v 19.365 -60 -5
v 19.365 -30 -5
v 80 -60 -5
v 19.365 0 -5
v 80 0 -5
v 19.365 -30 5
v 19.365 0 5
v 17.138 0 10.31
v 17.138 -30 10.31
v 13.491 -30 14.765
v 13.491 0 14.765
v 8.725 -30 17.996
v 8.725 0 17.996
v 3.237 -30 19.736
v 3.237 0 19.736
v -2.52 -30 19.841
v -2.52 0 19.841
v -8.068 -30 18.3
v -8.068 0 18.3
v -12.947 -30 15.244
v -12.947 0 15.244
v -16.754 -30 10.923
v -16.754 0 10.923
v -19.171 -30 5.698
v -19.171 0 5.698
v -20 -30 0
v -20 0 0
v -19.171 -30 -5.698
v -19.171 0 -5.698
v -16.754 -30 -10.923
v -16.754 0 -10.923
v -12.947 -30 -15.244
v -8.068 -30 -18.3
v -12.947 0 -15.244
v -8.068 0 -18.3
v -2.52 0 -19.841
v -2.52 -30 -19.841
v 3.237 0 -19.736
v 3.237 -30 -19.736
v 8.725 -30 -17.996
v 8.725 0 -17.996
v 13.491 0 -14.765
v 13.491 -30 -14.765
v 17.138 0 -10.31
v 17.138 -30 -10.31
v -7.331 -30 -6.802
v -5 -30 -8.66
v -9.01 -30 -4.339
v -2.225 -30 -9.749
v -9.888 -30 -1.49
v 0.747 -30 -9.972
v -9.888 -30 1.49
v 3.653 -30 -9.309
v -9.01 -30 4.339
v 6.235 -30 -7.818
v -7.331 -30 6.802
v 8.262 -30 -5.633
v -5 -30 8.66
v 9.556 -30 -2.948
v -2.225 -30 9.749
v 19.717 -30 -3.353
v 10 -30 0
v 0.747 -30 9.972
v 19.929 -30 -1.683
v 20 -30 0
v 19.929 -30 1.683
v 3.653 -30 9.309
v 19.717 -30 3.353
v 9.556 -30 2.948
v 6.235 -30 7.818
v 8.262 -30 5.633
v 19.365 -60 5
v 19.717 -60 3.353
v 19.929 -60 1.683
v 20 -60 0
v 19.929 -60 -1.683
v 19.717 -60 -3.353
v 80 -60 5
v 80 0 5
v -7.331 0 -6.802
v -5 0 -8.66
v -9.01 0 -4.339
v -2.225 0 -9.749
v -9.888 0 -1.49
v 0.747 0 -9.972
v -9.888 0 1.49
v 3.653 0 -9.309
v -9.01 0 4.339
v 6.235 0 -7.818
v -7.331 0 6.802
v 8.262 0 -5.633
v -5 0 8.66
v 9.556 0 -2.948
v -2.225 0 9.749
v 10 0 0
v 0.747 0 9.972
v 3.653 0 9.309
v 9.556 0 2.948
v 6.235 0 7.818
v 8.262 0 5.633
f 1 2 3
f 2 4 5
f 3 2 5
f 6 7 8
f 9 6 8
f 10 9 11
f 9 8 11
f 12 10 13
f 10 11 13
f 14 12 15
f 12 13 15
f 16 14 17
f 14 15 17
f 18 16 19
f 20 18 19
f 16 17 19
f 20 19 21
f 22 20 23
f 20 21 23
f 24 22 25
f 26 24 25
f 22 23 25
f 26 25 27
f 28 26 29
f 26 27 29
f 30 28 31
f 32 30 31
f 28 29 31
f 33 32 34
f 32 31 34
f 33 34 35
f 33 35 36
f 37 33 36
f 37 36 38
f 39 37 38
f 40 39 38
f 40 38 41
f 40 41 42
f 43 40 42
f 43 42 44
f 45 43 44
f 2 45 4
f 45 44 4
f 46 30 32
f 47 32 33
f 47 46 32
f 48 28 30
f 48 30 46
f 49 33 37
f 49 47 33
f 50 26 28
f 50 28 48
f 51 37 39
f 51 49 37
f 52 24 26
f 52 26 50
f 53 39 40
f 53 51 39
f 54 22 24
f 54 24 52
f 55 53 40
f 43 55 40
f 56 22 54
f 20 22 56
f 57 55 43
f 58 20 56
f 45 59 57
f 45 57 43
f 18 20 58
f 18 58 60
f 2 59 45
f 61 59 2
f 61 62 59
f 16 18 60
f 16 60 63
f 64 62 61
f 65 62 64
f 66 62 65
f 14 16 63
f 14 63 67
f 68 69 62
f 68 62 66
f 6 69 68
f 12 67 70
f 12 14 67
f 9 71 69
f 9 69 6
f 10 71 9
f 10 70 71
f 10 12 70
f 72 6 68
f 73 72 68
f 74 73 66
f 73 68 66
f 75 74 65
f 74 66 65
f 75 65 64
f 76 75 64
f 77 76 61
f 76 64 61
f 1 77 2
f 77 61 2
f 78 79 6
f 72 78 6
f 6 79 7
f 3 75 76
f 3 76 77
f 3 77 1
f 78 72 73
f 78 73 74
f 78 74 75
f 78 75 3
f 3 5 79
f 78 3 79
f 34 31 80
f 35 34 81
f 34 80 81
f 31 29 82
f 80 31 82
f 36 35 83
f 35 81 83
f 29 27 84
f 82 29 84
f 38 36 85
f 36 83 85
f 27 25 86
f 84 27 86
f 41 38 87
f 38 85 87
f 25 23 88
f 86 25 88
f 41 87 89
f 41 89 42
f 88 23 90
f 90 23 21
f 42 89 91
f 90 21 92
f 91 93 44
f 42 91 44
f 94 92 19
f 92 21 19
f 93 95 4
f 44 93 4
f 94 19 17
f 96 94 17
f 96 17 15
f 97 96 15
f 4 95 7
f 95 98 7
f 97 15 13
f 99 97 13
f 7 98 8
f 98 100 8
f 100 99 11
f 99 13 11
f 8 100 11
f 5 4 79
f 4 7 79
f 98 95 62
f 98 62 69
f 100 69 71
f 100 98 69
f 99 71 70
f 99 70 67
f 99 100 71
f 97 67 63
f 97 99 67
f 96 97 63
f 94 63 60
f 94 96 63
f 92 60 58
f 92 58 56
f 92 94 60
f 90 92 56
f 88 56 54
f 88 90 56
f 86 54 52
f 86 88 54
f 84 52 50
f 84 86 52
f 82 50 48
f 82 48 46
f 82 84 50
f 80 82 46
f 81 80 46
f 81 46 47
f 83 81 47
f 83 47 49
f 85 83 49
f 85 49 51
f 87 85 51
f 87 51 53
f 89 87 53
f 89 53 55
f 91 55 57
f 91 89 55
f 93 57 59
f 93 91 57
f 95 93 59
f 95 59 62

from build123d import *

# Parameters (mm, degrees)
F0_R     = 10
F1_DEPTH = 30
F2_DEPTH = 60


with BuildPart() as f1:
    # F0 (on Front) → F1 (new body)
    with BuildSketch(Plane.XZ):
        with BuildLine():
            ThreePointArc((19.364917, -5), (19.840594, -2.520086), (20, 0))
            ThreePointArc((20, 0), (19.840594, 2.520086), (19.364917, 5))
            ThreePointArc((19.364917, 5), (-20, 0), (19.364917, -5))
        make_face()
        Circle(F0_R, mode=Mode.SUBTRACT)
    extrude(amount=F1_DEPTH)

    # F0 (on Front) → F2 (join)
    with BuildSketch(Plane.XZ):
        with BuildLine():
            ThreePointArc((19.364917, 5), (19.840594, 2.520086), (20, 0))
            Line((20, 0), (80, 0))
            Line((80, 0), (80, 5))
            Line((80, 5), (19.364917, 5))
        make_face()
        with BuildLine():
            Line((80, 0), (20, 0))
            ThreePointArc((20, 0), (19.840594, -2.520086), (19.364917, -5))
            Line((19.364917, -5), (80, -5))
            Line((80, -5), (80, 0))
        make_face()
    extrude(amount=F2_DEPTH)


solid = f1.part
